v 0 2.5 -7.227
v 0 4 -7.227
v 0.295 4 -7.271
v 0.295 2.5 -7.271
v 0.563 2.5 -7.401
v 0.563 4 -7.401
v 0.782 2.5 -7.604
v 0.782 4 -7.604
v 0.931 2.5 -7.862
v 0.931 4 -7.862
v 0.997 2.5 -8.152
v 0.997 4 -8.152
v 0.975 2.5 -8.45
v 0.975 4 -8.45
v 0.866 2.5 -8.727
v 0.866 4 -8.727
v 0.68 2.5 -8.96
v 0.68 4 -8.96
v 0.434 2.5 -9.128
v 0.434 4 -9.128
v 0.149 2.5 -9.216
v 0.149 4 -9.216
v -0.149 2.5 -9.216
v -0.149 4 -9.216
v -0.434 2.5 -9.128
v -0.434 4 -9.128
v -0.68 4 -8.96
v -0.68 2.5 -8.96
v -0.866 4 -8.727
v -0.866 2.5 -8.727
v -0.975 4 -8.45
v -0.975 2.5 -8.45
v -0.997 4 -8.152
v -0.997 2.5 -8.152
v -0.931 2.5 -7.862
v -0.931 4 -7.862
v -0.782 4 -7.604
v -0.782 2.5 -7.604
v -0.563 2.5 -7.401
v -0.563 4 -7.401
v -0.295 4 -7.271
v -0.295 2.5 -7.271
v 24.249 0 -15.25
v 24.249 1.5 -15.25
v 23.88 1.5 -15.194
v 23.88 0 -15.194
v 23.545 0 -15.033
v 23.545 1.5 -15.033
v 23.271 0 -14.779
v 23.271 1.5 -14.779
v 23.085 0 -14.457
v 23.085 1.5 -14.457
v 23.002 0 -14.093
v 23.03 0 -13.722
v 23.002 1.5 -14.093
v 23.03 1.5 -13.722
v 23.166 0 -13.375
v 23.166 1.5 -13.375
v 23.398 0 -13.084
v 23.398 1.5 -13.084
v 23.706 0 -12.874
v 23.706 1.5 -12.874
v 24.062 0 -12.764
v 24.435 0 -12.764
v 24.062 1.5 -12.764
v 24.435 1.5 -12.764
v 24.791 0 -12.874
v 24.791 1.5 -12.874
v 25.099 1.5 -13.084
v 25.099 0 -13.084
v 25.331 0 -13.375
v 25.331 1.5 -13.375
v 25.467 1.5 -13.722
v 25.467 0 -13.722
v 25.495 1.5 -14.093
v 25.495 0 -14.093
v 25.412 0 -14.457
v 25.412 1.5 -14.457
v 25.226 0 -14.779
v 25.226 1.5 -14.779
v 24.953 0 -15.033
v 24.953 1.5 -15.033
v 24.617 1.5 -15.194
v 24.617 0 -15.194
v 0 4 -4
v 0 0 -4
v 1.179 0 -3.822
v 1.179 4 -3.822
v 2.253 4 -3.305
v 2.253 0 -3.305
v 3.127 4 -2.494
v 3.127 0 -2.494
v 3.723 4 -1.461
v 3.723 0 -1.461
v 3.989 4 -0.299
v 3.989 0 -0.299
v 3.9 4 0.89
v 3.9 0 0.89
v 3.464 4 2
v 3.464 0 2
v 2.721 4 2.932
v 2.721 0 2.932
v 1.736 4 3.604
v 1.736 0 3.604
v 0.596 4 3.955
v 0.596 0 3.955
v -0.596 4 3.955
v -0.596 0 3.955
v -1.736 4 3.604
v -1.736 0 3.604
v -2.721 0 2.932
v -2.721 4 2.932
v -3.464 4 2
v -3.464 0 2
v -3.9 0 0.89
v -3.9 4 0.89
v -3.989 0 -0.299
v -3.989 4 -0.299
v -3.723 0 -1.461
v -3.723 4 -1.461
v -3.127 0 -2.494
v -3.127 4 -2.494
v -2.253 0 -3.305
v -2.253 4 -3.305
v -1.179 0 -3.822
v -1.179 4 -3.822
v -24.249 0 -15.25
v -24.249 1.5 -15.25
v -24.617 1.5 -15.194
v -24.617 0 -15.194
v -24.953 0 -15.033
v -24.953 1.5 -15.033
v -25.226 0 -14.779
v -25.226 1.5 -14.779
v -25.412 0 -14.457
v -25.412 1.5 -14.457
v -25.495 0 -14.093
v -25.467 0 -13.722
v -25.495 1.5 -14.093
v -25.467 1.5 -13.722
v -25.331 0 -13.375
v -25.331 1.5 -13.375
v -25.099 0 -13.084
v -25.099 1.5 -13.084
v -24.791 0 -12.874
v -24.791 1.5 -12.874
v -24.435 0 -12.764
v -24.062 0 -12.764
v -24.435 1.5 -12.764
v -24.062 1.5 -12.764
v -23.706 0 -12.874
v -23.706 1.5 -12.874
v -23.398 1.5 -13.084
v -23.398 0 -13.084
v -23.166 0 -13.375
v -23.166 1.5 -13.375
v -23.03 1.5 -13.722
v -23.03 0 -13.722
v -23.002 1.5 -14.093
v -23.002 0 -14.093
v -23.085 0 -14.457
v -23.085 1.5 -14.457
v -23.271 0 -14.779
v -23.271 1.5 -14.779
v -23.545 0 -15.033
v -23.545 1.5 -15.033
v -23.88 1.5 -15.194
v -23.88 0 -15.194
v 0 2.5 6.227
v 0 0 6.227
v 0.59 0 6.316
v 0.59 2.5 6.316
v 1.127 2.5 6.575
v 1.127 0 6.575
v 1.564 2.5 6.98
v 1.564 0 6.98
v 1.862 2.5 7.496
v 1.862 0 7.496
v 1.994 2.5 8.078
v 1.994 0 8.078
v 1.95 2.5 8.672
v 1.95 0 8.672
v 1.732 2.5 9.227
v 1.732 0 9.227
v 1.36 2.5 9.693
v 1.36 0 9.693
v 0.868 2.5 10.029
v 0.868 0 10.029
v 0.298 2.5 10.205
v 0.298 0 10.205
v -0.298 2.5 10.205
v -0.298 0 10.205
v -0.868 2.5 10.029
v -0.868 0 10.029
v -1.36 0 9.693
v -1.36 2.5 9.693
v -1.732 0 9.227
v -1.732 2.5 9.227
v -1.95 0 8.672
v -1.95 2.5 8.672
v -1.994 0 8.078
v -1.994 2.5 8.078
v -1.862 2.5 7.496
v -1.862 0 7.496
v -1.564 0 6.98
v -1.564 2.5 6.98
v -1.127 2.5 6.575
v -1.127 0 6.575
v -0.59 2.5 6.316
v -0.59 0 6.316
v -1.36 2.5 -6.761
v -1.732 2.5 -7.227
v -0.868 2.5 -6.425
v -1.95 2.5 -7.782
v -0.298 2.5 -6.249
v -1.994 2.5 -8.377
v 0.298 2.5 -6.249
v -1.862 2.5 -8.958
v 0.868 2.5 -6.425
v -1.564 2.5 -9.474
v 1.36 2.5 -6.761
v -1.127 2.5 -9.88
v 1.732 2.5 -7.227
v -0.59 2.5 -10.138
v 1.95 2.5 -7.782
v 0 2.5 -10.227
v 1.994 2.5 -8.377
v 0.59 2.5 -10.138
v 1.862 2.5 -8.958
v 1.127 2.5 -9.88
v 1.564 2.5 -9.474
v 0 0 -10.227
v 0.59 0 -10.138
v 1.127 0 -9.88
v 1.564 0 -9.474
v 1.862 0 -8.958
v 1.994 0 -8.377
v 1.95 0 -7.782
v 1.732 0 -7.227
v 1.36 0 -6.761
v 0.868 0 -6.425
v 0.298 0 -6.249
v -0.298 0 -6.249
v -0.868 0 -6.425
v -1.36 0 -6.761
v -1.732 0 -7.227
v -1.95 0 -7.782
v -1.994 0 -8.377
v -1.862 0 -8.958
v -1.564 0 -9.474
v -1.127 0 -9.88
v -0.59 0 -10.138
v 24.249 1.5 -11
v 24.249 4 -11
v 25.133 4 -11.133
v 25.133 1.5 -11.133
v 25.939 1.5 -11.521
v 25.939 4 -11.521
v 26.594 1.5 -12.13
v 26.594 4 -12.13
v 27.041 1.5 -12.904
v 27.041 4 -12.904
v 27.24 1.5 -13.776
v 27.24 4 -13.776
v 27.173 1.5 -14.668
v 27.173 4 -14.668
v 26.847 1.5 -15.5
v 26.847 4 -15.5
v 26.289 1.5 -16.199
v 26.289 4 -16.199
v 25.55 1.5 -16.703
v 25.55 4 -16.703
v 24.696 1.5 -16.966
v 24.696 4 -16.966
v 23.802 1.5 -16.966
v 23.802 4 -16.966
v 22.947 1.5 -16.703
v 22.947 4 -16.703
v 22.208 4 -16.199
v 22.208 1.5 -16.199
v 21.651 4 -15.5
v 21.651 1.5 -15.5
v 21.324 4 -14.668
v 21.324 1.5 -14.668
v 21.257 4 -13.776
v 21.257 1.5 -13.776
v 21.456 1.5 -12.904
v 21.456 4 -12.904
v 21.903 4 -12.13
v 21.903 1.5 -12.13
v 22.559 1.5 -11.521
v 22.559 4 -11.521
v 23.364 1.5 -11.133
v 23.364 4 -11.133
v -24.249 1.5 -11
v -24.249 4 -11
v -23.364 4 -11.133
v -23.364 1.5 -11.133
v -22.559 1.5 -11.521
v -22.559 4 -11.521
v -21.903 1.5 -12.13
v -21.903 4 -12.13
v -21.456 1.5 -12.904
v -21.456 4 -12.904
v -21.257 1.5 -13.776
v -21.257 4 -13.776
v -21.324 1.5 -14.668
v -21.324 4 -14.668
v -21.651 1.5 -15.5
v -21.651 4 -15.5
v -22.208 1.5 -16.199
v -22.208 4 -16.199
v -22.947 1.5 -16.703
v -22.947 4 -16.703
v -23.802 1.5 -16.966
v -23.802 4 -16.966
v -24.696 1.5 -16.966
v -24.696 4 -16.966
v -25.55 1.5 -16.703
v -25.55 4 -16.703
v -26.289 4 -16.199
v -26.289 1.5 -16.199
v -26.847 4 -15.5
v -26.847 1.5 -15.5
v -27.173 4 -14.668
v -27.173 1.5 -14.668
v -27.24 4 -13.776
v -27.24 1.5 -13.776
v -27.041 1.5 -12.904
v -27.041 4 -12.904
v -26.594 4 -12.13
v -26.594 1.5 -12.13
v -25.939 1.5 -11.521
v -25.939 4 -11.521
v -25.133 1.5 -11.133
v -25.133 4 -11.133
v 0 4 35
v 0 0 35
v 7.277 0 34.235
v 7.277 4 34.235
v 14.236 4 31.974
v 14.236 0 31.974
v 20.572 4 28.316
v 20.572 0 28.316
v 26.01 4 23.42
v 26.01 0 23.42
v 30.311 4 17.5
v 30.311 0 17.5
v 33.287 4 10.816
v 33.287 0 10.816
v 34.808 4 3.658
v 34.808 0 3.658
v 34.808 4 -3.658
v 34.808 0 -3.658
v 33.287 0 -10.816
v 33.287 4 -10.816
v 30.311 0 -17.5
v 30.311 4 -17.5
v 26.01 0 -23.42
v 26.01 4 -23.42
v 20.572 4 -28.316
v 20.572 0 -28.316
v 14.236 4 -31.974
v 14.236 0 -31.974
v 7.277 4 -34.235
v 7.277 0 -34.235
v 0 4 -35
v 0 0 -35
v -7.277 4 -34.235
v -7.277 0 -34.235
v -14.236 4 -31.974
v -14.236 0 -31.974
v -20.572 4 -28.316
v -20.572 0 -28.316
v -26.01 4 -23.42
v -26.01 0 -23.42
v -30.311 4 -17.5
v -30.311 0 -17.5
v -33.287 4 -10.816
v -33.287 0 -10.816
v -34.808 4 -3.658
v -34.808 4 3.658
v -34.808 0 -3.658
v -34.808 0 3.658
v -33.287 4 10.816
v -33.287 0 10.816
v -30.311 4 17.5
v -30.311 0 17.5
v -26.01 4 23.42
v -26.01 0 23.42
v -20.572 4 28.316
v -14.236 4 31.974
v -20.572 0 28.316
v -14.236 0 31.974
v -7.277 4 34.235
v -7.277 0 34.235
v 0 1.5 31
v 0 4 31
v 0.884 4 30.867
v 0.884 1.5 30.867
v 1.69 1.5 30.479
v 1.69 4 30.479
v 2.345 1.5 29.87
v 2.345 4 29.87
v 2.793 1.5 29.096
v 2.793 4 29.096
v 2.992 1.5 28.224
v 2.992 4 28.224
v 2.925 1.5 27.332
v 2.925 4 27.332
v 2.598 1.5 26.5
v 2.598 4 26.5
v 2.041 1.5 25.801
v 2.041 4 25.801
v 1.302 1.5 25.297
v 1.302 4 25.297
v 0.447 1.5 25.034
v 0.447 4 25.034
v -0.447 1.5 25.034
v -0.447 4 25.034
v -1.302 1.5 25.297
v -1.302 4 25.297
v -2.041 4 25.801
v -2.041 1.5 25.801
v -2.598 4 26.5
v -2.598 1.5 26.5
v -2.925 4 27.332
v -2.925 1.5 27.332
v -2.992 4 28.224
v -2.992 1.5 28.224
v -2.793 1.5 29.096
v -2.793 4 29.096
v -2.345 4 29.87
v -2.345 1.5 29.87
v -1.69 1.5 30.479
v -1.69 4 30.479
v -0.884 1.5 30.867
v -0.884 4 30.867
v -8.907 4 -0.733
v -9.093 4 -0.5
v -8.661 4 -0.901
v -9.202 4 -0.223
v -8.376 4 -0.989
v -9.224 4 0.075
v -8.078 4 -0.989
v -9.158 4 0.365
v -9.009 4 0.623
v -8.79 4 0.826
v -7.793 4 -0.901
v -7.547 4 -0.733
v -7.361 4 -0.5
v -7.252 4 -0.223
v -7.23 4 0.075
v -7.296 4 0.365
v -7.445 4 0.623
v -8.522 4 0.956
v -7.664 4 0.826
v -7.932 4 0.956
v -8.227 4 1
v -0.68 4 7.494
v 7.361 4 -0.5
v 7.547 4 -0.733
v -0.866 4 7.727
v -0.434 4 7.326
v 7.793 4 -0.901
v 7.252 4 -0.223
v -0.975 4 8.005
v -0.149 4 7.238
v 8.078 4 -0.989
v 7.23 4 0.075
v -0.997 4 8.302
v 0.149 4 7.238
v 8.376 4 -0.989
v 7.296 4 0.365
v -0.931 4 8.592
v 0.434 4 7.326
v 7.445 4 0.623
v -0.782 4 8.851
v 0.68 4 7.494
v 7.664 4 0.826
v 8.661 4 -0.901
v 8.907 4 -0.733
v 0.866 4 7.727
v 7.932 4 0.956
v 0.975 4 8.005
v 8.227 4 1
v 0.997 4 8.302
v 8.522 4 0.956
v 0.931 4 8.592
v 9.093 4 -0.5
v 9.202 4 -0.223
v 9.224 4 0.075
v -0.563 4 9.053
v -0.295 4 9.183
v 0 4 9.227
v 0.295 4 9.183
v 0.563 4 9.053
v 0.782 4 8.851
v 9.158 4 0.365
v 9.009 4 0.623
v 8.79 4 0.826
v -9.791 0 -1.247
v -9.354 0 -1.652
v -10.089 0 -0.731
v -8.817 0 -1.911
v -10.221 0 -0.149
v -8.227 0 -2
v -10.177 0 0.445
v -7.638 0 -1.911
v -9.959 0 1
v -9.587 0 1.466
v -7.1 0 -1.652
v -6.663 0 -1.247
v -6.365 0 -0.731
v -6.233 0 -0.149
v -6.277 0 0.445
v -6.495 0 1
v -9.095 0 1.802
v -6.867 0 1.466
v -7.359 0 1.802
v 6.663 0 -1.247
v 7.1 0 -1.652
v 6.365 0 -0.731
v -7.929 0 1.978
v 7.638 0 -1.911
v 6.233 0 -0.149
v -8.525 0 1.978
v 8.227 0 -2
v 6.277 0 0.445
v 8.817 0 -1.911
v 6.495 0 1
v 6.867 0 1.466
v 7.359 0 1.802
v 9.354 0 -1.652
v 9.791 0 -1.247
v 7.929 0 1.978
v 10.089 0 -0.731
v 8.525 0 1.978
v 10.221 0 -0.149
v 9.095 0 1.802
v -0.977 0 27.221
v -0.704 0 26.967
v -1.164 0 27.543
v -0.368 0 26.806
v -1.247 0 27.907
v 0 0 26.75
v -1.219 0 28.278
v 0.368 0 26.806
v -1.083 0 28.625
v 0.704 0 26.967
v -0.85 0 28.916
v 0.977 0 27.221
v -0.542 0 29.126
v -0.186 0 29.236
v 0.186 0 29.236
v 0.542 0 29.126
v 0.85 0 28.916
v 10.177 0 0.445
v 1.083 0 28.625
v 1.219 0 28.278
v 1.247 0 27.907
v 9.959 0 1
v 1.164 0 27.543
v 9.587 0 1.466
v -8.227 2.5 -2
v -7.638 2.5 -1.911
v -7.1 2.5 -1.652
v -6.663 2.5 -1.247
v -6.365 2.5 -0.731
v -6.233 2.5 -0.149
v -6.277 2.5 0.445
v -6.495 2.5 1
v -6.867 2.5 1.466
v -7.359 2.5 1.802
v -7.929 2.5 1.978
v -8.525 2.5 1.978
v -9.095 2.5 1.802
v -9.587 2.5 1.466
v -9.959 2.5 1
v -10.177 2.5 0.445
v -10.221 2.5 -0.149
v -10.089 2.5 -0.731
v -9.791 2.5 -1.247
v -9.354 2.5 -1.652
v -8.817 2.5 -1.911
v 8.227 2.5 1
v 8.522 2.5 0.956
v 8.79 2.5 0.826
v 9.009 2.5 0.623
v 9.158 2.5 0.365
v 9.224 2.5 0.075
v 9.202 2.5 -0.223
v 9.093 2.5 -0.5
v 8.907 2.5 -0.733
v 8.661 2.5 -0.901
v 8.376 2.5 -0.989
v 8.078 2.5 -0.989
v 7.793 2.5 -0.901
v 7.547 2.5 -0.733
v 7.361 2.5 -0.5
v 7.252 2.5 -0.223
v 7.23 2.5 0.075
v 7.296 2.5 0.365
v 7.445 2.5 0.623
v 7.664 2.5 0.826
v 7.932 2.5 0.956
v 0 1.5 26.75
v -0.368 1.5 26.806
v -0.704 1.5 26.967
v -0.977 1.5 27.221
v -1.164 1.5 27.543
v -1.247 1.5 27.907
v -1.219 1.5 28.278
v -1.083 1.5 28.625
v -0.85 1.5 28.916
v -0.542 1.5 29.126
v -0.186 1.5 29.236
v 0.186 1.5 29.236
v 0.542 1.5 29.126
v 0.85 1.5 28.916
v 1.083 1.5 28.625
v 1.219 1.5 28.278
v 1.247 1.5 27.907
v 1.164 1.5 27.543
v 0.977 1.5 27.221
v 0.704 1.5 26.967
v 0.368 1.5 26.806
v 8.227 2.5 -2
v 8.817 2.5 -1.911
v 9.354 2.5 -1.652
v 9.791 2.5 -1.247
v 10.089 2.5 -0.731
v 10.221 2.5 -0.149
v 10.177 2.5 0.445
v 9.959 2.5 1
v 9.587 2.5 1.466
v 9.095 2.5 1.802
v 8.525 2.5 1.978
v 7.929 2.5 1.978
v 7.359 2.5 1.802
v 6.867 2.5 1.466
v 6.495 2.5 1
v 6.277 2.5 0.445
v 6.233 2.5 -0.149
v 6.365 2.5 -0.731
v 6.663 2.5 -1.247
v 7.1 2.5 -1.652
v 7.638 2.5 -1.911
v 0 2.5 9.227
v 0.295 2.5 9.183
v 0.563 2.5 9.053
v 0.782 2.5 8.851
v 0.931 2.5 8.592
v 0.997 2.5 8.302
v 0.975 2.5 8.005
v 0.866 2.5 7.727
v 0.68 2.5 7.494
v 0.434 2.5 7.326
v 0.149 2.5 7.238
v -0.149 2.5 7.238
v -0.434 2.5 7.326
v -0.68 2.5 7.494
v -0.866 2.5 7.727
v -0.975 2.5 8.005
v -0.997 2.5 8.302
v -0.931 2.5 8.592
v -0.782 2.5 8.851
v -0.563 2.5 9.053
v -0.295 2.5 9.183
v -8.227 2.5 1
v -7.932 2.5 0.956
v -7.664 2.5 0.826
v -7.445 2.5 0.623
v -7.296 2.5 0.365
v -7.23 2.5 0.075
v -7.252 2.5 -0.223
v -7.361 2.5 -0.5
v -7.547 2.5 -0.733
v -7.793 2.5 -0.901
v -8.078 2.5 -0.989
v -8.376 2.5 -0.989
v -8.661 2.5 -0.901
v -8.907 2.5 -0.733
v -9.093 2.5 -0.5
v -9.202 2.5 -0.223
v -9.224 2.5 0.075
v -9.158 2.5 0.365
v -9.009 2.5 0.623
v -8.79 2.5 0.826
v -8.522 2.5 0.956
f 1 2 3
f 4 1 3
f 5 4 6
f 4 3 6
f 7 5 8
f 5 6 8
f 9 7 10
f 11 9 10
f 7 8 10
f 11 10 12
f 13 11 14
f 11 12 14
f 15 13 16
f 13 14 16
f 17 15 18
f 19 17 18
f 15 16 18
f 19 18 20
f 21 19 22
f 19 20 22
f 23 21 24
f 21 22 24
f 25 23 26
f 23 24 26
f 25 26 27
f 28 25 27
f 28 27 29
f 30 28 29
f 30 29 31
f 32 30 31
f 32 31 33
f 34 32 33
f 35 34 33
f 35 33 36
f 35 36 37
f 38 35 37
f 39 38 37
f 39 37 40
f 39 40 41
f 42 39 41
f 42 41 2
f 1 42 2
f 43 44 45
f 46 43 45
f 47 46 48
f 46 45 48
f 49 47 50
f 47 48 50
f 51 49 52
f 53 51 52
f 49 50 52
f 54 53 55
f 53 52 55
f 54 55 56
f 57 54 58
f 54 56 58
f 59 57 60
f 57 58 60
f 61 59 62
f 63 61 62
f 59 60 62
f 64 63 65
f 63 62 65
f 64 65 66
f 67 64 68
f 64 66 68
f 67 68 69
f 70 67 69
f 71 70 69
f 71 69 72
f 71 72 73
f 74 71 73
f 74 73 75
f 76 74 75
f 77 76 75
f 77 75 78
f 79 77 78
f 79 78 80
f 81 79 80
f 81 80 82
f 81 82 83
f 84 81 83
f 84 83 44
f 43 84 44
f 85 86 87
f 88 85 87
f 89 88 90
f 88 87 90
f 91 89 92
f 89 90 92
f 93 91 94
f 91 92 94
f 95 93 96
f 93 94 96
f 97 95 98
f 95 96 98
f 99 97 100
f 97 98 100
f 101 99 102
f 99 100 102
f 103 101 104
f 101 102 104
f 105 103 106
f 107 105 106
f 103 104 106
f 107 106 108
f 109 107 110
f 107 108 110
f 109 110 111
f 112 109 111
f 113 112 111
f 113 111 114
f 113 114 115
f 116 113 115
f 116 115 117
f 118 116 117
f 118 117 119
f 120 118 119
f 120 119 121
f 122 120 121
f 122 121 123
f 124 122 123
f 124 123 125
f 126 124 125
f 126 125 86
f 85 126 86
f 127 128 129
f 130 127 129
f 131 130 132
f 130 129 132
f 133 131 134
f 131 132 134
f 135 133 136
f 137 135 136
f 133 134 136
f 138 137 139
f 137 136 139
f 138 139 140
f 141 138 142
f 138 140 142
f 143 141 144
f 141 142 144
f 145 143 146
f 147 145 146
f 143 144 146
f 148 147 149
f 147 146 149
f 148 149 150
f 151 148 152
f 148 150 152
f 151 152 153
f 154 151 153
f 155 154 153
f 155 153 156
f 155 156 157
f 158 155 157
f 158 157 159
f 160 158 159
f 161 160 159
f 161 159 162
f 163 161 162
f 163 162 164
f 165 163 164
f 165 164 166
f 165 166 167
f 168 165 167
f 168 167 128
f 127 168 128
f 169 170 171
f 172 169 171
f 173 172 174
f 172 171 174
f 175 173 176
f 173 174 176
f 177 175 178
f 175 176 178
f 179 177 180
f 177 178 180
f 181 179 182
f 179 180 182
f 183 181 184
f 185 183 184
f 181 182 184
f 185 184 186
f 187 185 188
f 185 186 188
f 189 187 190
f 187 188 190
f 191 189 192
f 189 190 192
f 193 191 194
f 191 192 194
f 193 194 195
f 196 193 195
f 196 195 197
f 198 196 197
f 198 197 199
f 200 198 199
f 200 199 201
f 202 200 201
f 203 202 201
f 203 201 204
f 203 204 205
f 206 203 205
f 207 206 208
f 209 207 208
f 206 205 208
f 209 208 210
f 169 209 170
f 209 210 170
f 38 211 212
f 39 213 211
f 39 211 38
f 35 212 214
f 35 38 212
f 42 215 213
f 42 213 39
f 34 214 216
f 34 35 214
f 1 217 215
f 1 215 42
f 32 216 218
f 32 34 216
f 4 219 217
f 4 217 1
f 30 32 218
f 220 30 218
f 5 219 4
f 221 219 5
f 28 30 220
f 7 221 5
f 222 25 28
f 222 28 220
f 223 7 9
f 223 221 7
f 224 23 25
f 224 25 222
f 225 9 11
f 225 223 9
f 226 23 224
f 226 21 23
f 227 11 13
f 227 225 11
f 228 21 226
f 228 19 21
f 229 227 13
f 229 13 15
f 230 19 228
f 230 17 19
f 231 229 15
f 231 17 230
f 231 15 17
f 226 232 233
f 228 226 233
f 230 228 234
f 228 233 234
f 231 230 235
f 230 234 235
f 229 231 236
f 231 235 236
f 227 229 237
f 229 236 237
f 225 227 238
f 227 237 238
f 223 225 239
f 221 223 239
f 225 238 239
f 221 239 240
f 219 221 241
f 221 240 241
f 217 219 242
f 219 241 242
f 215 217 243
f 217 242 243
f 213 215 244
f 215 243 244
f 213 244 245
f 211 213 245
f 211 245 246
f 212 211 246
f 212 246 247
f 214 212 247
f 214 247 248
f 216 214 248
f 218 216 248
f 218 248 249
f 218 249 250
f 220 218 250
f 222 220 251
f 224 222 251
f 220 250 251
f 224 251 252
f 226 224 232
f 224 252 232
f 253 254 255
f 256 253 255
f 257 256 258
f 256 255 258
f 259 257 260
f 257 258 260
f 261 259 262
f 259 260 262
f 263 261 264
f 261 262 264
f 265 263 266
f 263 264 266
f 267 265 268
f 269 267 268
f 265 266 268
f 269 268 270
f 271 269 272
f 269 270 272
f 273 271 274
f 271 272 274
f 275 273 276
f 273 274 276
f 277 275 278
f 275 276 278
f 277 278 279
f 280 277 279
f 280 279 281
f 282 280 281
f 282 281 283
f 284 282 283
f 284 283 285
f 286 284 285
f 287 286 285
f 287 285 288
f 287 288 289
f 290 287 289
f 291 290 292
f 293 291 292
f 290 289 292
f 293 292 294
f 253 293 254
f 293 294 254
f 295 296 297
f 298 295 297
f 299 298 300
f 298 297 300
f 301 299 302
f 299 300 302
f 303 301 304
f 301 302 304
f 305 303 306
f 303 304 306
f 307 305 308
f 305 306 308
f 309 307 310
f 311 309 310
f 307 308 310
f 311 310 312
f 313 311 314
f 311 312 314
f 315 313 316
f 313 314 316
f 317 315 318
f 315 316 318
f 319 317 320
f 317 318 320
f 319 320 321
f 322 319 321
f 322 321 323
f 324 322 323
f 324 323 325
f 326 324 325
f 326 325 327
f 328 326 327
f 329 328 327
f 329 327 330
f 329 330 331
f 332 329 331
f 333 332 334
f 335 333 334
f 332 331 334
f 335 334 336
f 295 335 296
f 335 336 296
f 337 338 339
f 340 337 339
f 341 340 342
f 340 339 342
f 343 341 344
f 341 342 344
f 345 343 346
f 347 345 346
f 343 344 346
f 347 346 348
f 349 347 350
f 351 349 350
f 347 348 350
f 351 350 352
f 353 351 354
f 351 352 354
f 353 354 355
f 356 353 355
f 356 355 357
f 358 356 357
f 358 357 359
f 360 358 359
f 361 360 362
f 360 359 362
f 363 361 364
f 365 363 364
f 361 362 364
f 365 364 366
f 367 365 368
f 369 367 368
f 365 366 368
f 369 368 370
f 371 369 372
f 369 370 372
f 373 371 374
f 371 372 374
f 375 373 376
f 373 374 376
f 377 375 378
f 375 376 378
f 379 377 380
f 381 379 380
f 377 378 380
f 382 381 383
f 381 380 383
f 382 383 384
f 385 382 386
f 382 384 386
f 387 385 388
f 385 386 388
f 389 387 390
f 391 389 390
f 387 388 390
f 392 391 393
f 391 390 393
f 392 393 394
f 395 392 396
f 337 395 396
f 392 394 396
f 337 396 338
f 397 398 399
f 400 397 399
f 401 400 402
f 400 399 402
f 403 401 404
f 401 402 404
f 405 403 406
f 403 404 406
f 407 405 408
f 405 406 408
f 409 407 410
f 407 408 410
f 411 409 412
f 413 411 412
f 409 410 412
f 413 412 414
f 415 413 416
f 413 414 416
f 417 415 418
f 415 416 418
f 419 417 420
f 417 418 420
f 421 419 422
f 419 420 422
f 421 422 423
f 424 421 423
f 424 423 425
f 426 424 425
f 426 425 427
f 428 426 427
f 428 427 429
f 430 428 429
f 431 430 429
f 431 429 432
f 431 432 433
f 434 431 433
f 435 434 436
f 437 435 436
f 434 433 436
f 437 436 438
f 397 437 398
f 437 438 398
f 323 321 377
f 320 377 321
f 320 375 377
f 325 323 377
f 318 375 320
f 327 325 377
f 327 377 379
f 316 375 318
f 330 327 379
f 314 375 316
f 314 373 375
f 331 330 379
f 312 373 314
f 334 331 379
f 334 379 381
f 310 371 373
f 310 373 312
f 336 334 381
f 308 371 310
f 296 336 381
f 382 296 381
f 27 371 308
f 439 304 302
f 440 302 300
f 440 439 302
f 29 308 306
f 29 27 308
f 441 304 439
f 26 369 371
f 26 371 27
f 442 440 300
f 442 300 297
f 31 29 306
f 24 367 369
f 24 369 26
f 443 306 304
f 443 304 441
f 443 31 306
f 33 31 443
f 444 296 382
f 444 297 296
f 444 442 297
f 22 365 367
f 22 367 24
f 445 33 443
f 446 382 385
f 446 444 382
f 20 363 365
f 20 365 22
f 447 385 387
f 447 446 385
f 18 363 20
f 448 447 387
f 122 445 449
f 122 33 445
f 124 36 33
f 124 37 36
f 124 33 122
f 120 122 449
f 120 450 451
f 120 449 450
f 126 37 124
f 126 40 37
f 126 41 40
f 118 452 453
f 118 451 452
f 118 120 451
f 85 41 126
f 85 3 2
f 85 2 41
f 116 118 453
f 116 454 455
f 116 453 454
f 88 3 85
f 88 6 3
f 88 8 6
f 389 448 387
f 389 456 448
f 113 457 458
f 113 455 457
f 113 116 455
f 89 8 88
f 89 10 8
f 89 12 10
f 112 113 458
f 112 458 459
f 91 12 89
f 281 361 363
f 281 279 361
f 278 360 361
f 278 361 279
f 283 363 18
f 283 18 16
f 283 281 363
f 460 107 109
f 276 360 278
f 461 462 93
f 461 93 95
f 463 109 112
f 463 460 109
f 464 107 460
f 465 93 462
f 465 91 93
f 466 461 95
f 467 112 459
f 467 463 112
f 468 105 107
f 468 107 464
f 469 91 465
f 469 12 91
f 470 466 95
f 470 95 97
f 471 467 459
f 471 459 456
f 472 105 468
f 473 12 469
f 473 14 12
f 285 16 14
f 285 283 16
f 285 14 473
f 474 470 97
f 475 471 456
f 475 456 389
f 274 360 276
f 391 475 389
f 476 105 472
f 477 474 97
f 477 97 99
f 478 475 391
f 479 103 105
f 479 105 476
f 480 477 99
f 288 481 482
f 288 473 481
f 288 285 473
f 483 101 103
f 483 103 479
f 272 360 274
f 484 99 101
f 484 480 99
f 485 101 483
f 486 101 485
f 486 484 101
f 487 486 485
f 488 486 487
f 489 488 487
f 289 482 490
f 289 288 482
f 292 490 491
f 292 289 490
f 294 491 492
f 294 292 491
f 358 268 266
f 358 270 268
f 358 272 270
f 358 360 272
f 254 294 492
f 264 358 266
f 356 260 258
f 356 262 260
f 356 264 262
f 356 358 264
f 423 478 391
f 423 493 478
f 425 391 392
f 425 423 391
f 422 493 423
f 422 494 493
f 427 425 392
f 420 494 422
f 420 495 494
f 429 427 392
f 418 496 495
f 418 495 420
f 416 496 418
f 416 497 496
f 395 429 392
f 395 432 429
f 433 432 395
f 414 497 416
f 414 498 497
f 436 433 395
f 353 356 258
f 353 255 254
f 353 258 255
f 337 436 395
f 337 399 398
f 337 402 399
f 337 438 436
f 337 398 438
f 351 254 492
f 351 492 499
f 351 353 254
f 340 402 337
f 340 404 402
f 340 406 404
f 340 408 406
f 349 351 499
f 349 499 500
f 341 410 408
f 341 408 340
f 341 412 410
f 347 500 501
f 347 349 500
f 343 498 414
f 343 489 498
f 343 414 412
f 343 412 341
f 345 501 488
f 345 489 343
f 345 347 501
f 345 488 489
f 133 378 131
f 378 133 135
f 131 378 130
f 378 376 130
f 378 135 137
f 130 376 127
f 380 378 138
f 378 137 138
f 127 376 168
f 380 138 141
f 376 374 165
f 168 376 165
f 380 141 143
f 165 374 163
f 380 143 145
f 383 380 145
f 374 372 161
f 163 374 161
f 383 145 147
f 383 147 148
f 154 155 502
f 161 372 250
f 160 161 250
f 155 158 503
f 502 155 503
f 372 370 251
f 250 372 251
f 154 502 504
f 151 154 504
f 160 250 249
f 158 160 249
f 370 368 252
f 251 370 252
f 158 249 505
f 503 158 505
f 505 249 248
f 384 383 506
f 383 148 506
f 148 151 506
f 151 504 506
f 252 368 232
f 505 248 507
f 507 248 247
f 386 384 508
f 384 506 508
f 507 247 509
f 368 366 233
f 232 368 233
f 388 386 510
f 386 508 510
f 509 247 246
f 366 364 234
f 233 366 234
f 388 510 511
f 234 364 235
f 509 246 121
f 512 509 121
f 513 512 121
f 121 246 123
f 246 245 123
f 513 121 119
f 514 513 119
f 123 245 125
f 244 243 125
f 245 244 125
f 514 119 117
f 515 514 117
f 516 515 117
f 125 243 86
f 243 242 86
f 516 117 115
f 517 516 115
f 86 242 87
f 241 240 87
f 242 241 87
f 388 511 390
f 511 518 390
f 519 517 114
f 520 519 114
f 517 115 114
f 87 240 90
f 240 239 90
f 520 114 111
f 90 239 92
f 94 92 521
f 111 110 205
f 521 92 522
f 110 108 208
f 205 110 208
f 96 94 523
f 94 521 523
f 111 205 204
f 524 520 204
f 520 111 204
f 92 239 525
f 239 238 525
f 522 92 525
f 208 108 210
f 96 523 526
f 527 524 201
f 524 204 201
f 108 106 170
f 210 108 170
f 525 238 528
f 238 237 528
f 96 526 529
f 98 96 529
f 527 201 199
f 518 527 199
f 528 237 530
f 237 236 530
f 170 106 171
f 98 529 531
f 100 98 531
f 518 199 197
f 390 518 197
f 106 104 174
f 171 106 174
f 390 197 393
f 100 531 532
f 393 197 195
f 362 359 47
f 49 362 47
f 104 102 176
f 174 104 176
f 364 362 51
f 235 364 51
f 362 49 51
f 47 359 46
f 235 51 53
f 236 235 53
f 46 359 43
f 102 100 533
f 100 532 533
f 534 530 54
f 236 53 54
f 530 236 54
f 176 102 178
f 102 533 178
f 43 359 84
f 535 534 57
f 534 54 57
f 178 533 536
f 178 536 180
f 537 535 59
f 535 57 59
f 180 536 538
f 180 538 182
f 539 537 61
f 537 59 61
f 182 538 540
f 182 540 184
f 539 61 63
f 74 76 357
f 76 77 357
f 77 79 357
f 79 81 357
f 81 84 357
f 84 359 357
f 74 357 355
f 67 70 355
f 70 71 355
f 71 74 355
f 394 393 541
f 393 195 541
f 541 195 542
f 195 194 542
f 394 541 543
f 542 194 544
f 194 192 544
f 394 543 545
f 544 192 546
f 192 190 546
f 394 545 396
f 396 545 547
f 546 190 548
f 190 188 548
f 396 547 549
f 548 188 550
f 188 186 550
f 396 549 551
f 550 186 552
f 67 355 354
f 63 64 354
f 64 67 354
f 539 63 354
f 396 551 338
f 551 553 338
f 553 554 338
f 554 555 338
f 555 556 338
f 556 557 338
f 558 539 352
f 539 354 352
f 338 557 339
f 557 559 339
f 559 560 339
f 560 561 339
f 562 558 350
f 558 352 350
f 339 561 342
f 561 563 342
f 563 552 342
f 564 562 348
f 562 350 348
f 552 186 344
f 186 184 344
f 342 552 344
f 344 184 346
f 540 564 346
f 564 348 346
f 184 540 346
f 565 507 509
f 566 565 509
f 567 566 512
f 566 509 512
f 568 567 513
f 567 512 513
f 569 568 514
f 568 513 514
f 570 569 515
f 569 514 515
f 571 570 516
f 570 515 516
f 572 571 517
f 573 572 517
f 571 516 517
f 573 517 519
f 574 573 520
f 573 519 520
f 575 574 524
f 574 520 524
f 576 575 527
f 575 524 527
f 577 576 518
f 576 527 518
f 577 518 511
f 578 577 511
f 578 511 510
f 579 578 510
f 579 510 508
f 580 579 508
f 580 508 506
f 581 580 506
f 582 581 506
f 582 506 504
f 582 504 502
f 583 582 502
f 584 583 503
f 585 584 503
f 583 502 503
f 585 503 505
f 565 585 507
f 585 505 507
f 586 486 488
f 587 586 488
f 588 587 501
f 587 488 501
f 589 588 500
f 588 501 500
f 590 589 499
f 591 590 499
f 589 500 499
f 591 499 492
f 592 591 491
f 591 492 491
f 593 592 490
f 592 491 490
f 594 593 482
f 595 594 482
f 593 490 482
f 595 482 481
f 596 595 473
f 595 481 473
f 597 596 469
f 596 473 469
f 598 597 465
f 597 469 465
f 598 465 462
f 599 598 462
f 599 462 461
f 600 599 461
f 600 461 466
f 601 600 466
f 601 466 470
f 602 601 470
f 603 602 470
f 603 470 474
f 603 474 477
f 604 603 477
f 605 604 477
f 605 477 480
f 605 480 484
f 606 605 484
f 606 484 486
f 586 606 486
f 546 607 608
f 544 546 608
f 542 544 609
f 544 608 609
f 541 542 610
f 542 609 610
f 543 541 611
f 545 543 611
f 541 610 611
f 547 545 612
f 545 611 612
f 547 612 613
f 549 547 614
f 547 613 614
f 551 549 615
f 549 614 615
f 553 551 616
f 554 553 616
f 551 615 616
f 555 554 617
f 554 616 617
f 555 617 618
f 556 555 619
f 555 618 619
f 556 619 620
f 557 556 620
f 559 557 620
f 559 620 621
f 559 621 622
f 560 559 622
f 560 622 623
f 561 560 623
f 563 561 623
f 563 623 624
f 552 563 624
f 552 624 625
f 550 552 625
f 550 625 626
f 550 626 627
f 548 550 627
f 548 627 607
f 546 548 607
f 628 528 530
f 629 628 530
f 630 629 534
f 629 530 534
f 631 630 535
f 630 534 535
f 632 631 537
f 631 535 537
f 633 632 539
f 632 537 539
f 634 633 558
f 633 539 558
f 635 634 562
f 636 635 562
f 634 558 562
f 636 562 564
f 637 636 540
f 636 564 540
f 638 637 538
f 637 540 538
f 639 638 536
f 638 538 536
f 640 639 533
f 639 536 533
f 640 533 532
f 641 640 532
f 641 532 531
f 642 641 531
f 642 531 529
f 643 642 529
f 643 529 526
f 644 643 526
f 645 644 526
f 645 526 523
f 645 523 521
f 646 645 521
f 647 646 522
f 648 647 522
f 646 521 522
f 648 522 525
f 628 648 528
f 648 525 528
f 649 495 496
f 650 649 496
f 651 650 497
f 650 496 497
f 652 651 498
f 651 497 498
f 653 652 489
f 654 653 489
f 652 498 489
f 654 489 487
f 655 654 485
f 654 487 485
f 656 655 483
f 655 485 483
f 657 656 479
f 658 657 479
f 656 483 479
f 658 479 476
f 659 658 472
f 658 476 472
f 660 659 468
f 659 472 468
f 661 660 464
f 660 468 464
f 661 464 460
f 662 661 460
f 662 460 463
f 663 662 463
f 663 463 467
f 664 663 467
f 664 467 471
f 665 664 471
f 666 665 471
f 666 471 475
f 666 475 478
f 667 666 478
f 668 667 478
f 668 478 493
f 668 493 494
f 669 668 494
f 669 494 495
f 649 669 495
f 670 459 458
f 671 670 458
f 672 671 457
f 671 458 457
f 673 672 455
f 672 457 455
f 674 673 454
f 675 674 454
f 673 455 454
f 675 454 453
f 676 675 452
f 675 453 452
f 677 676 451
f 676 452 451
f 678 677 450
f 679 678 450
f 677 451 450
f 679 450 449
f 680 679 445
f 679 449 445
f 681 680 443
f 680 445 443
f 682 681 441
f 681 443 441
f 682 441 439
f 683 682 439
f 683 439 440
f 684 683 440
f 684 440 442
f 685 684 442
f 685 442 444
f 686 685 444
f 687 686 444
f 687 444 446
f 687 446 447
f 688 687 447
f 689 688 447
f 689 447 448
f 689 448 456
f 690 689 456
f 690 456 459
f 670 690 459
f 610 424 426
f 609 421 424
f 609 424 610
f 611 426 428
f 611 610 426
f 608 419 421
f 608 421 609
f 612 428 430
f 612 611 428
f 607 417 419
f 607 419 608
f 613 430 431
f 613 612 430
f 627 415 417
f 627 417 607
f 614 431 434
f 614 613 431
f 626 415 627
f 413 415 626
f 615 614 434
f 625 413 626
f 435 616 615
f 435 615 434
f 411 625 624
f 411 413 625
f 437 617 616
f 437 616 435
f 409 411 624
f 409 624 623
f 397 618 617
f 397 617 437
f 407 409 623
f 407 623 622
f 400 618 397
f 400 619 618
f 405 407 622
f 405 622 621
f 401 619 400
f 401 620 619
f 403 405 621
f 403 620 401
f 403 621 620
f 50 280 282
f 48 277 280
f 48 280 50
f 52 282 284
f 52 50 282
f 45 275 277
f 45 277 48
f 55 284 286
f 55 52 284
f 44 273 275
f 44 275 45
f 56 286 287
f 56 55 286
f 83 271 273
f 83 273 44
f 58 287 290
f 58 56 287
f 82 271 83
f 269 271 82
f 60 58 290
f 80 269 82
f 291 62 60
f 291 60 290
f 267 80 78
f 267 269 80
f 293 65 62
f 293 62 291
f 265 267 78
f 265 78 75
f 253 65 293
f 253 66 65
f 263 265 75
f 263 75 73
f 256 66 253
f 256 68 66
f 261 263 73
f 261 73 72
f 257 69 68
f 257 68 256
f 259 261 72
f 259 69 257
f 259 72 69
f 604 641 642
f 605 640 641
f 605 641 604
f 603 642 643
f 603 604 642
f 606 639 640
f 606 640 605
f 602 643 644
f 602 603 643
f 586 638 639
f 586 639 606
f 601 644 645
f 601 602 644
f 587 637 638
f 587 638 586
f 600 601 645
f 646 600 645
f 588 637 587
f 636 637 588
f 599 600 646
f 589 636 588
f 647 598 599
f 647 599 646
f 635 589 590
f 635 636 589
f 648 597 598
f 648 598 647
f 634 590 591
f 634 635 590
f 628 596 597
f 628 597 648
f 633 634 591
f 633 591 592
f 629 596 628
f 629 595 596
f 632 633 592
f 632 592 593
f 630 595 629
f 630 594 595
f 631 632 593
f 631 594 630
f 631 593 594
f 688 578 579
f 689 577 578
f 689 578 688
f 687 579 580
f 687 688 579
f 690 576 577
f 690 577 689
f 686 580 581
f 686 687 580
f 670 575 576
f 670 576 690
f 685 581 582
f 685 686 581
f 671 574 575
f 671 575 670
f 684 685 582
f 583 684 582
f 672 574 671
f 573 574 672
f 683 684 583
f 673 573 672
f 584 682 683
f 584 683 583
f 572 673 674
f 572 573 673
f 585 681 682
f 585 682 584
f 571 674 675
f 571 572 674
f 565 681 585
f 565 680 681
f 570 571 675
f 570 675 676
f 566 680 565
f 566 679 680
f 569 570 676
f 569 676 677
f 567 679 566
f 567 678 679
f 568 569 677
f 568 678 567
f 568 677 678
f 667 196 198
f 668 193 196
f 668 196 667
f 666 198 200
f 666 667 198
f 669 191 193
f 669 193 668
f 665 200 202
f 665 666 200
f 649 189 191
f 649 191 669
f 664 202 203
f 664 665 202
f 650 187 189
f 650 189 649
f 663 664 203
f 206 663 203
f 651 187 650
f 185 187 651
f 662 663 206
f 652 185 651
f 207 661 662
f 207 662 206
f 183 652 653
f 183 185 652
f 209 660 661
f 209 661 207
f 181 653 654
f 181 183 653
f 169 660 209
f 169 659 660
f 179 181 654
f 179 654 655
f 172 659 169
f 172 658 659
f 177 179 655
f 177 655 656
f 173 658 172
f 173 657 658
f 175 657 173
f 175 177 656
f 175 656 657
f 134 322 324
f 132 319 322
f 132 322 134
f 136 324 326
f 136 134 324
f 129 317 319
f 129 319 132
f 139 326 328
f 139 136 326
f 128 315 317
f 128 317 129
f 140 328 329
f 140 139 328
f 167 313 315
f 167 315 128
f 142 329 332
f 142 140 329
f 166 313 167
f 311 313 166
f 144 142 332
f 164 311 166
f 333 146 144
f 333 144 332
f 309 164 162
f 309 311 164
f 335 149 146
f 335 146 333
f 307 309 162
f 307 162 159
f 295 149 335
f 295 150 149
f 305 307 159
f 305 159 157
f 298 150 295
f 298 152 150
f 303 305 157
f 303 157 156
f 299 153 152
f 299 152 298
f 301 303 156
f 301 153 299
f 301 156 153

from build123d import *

# Parameters (mm, degrees)
SKETCH1_R           = 35
BOSS_EXTRUDE1_DEPTH = 4
SKETCH2_R           = 1
SKETCH2_R_2         = 1.25
CUT_EXTRUDE1_DEPTH  = 50.658836072
CUT_EXTRUDE2_REACH  = 51.659
SKETCH3_R           = 4
SKETCH4_R           = 3
CUT_EXTRUDE3_DEPTH  = 2.5
SKETCH5_R           = 2
CUT_EXTRUDE4_DEPTH  = 2.5


with BuildPart() as part:
    # Sketch1 → Boss-Extrude1 (new body)
    with BuildSketch(Plane(origin=(0, 0, 0), x_dir=(1, 0, 0), z_dir=(0, 1, 0))):
        with Locations(Location((0, 0, 0), (0, 0, 270))):
            Circle(SKETCH1_R)
    extrude(amount=BOSS_EXTRUDE1_DEPTH)

    # Sketch2 → Cut-Extrude1 (cut, through all)
    with BuildSketch(Plane(origin=(0, 4, 0), x_dir=(1, 0, 0), z_dir=(0, 1, 0))):
        with Locations(Location((0, 8.227062517, 0), (0, 0, 270))):
            Circle(SKETCH2_R)
        with Locations(Location((8.227062517, 0, 0), (0, 0, 270))):
            Circle(SKETCH2_R)
        with Locations(Location((0, -8.227062517, 0), (0, 0, 270))):
            Circle(SKETCH2_R)
        with Locations(Location((-8.227062517, 0, 0), (0, 0, 270))):
            Circle(SKETCH2_R)
        with Locations(Location((0, -28, 0), (0, 0, 90))):
            Circle(SKETCH2_R_2)
        with Locations(Location((-24.248711306, 14, 0), (0, 0, 90))):
            Circle(SKETCH2_R_2)
        with Locations(Location((24.248711306, 14, 0), (0, 0, 90))):
            Circle(SKETCH2_R_2)
    extrude(amount=-CUT_EXTRUDE1_DEPTH, mode=Mode.SUBTRACT)

    # Sketch3 → Cut-Extrude2 (cut, up to next)
    with BuildSketch(Plane.XZ, mode=Mode.PRIVATE) as cut_extrude2_sk1:
        with Locations(Location((0, 0, 0), (0, 0, 270))):
            Circle(SKETCH3_R)
    cut_extrude2_tool1 = extrude(cut_extrude2_sk1.sketch, amount=-CUT_EXTRUDE2_REACH, mode=Mode.PRIVATE) & part.part
    add(cut_extrude2_tool1.solids().sort_by_distance((0, 0, 0))[0], mode=Mode.SUBTRACT)

    # Sketch4 → Cut-Extrude3 (cut)
    with BuildSketch(Plane(origin=(0, 4, 0), x_dir=(1, 0, 0), z_dir=(0, 1, 0))):
        with Locations(Location((24.248711306, 14, 0), (0, 0, 270))):
            Circle(SKETCH4_R)
        with Locations(Location((0, -28, 0), (0, 0, 270))):
            Circle(SKETCH4_R)
        with Locations(Location((-24.248711306, 14, 0), (0, 0, 270))):
            Circle(SKETCH4_R)
    extrude(amount=-CUT_EXTRUDE3_DEPTH, mode=Mode.SUBTRACT)

    # Sketch5 → Cut-Extrude4 (cut)
    with BuildSketch(Plane.XZ):
        with Locations(Location((0, 8.227062517, 0), (0, 0, 270))):
            Circle(SKETCH5_R)
        with Locations(Location((8.227062517, 0, 0), (0, 0, 270))):
            Circle(SKETCH5_R)
        with Locations(Location((0, -8.227062517, 0), (0, 0, 270))):
            Circle(SKETCH5_R)
        with Locations(Location((-8.227062517, 0, 0), (0, 0, 270))):
            Circle(SKETCH5_R)
    extrude(amount=-CUT_EXTRUDE4_DEPTH, mode=Mode.SUBTRACT)


solid = part.part
